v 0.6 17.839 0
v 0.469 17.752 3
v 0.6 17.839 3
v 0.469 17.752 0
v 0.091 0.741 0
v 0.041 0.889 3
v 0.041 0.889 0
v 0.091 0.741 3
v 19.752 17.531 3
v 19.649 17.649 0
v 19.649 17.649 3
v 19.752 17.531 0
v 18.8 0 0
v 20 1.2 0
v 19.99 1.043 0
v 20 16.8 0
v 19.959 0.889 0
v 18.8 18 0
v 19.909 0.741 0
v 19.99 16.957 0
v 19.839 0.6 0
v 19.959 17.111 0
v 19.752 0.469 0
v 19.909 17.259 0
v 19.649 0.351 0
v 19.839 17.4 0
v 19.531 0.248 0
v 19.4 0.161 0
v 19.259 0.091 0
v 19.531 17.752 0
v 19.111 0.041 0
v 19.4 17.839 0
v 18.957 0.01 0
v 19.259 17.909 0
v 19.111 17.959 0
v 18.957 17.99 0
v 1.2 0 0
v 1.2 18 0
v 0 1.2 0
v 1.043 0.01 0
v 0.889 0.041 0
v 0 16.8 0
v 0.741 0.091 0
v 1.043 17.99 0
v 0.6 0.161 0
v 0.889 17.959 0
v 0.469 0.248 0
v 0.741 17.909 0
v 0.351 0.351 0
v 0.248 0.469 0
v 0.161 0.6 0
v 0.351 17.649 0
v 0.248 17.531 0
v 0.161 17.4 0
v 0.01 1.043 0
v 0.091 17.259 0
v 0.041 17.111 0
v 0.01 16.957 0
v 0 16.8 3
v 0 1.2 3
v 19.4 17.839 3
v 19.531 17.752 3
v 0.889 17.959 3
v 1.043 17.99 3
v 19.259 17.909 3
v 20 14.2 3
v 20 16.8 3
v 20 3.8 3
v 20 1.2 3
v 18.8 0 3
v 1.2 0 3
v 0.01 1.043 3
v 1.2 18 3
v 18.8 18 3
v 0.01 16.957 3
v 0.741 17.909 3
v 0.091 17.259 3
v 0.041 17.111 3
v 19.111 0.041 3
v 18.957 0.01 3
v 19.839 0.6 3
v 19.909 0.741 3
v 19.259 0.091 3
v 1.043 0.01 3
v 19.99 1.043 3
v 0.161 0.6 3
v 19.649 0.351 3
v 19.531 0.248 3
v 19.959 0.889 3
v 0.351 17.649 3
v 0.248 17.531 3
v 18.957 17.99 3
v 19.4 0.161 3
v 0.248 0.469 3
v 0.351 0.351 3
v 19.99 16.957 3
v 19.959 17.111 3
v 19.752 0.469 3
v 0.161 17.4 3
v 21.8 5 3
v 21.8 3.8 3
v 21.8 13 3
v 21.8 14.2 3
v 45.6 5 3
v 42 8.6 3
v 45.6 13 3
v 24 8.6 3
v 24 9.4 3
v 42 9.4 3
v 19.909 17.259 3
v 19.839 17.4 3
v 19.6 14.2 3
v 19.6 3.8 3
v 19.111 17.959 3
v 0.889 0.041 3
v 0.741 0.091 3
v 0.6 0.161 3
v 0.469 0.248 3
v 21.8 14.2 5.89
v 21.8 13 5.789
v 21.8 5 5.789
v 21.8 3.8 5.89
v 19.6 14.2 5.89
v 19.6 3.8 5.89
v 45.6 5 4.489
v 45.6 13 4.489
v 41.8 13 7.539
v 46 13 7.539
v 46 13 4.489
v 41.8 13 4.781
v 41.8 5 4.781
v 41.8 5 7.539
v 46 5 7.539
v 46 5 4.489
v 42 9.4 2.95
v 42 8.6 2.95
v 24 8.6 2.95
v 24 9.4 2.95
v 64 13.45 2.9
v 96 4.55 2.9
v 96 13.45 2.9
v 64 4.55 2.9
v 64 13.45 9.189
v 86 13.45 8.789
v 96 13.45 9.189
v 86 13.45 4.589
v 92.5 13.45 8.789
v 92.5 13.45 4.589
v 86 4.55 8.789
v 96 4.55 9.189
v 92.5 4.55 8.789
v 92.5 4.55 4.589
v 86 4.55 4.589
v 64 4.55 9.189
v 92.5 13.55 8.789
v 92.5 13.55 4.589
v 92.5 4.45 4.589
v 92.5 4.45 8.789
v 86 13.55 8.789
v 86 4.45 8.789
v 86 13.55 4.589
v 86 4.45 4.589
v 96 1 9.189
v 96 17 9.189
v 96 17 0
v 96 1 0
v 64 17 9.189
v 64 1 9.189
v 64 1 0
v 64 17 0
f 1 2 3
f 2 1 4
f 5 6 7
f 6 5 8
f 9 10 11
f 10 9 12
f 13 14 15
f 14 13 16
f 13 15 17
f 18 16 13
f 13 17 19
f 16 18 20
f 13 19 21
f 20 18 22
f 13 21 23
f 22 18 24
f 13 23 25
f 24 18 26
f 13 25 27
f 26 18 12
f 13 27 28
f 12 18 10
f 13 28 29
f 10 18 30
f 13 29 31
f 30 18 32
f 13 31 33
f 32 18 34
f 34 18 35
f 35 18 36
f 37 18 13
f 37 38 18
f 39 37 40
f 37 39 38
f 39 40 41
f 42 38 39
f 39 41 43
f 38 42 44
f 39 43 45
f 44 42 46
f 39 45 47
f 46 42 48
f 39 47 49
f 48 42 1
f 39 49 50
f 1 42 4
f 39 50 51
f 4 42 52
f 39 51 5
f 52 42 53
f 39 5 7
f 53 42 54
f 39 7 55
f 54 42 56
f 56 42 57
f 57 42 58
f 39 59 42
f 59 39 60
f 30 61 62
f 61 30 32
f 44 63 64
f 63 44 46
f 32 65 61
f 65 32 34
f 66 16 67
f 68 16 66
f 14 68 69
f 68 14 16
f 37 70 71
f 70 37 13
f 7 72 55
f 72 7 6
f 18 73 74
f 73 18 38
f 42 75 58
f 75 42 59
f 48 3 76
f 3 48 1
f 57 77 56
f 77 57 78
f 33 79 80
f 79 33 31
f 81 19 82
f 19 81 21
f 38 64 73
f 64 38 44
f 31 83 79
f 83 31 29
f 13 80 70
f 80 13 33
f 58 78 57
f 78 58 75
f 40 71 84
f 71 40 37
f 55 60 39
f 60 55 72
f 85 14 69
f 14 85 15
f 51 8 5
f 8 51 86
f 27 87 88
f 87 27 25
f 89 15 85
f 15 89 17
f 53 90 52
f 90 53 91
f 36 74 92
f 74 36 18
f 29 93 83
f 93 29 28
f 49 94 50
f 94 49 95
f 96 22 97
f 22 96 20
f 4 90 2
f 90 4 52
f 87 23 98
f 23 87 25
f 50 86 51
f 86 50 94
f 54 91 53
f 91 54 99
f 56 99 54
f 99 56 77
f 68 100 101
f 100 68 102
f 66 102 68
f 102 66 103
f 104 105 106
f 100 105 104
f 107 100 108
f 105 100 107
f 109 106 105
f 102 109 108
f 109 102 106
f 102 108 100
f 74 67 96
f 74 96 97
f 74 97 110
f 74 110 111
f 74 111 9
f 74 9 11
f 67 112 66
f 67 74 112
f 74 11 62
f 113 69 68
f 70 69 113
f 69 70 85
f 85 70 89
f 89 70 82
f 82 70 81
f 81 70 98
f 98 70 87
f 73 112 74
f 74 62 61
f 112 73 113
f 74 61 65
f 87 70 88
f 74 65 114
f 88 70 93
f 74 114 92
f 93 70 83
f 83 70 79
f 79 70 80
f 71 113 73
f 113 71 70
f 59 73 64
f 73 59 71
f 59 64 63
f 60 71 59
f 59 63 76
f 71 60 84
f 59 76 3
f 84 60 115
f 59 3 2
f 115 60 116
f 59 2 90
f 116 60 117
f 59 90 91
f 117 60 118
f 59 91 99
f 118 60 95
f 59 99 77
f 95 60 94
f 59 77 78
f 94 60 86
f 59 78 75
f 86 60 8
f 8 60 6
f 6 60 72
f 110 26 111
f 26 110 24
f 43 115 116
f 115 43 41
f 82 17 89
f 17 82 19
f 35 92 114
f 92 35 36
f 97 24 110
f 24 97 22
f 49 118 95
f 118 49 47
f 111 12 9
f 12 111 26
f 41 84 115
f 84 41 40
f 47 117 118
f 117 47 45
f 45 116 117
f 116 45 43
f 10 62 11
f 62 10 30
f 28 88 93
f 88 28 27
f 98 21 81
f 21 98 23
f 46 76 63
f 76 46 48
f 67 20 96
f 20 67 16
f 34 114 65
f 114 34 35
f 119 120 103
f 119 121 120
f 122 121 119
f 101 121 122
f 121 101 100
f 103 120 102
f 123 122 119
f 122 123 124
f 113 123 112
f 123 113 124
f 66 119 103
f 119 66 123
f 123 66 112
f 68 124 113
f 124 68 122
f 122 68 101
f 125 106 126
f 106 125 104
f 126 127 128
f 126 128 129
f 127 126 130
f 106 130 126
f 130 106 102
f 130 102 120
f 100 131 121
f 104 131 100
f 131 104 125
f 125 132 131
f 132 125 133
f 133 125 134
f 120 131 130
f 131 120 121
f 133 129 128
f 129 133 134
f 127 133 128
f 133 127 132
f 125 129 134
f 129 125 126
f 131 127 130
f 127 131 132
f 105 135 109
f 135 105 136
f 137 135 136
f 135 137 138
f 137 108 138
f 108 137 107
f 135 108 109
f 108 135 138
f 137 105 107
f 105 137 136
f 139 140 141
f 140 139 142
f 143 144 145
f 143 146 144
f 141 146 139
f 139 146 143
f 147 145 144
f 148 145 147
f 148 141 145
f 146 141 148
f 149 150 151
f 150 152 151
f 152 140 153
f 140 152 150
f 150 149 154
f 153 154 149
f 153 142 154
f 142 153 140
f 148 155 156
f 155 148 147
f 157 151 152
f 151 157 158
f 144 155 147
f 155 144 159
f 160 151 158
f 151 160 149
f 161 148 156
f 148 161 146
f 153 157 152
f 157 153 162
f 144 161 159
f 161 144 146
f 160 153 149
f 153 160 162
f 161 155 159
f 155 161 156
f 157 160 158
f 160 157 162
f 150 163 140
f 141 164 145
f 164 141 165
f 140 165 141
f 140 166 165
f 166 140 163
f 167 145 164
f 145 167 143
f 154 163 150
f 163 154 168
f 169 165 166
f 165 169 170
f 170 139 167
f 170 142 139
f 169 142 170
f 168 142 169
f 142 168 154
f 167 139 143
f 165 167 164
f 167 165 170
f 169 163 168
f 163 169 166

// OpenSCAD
/*
Experiment 003: calculated cantilever latch.

This model uses the cantilever snap relation used in the snap-fit design
guide and the reference OpenSCAD library:

  h = 1.09 * eps * l^2 / y

where:
  h   = root thickness for a tapered cantilever arm
  eps = allowed strain as an absolute value
  l   = free arm length
  y   = required deflection / undercut

Part selector:
  part_id = 0; // preview
  part_id = 1; // latch with flexible cantilever hook
  part_id = 2; // striker block with ramp and catch window
*/

$fn = 48;

part_id = 0;

// Material/design assumptions for a conservative PLA/PETG first print.
allowed_strain = 0.018; // about 60% of 0.03 for repeated assembly tests
arm_length = 26;
target_deflection = 3.4;
safety_factor = 1.35;

arm_root_thickness = 1.09 * allowed_strain * arm_length * arm_length / target_deflection / safety_factor;
arm_tip_thickness = arm_root_thickness * 0.55;
arm_width = 8;
clearance = 0.45;

base_thickness = 3;
handle_length = 20;
handle_width = 18;
hook_height = target_deflection - clearance;
hook_length = 4.2;
root_relief = 1.2;

striker_length = 32;
striker_width = 16;
striker_height = base_thickness + target_deflection + arm_tip_thickness + 1.2;

module rounded_plate(size, r = 1.0) {
    hull() {
        for (x = [r, size[0] - r])
        for (y = [r, size[1] - r])
            translate([x, y, 0]) cylinder(h = size[2], r = r);
    }
}

module tapered_arm(length, width, root_h, tip_h) {
    hull() {
        translate([0, 0, 0])
            cube([0.2, width, root_h]);
        translate([length - 0.2, 0, 0])
            cube([0.2, width, tip_h]);
    }
}

module latch() {
    rounded_plate([handle_length, handle_width, base_thickness], 1.2);

    // Root pad and relief bump reduce abrupt stress concentration at the arm.
    translate([handle_length - 0.4, handle_width / 2 - arm_width / 2 - 1.2, base_thickness])
        cube([2.2, arm_width + 2.4, arm_root_thickness]);

    translate([handle_length - 0.4, handle_width / 2 - arm_width / 2, base_thickness])
        tapered_arm(arm_length, arm_width, arm_root_thickness, arm_tip_thickness);

    translate([handle_length + arm_length - hook_length, handle_width / 2 - arm_width / 2, base_thickness + arm_tip_thickness - 0.1])
        cube([hook_length, arm_width, hook_height + 0.1]);

    // Small underside clearance marker: this face should not collide with the striker base.
    translate([handle_length + 4, handle_width / 2 - 0.4, base_thickness - 0.05])
        cube([arm_length - 8, 0.8, 0.1]);
}

module striker_void() {
    channel_w = arm_width + 2 * clearance;
    channel_h = target_deflection + arm_root_thickness + clearance;

    // Open insertion tunnel for the arm.
    translate([-0.1, striker_width / 2 - channel_w / 2, base_thickness - 0.1])
        cube([striker_length + 0.2, channel_w, channel_h]);

    // Entry ramp clearance.
    translate([-0.1, striker_width / 2 - channel_w / 2, base_thickness + arm_tip_thickness])
        rotate([0, -24, 0])
            cube([9, channel_w, target_deflection + 1.0]);

    // Catch/release window after the hook passes the ramp.
    translate([striker_length - 10, striker_width / 2 - channel_w / 2 - 0.1, base_thickness + arm_tip_thickness])
        cube([6.5, channel_w + 0.2, hook_height + clearance + 0.8]);
}

module striker() {
    difference() {
        cube([striker_length, striker_width, striker_height]);
        striker_void();
    }
}

module both_preview() {
    latch();
    translate([64, 1, 0]) striker();
}

if (part_id == 1) {
    latch();
} else if (part_id == 2) {
    striker();
} else {
    both_preview();
}
